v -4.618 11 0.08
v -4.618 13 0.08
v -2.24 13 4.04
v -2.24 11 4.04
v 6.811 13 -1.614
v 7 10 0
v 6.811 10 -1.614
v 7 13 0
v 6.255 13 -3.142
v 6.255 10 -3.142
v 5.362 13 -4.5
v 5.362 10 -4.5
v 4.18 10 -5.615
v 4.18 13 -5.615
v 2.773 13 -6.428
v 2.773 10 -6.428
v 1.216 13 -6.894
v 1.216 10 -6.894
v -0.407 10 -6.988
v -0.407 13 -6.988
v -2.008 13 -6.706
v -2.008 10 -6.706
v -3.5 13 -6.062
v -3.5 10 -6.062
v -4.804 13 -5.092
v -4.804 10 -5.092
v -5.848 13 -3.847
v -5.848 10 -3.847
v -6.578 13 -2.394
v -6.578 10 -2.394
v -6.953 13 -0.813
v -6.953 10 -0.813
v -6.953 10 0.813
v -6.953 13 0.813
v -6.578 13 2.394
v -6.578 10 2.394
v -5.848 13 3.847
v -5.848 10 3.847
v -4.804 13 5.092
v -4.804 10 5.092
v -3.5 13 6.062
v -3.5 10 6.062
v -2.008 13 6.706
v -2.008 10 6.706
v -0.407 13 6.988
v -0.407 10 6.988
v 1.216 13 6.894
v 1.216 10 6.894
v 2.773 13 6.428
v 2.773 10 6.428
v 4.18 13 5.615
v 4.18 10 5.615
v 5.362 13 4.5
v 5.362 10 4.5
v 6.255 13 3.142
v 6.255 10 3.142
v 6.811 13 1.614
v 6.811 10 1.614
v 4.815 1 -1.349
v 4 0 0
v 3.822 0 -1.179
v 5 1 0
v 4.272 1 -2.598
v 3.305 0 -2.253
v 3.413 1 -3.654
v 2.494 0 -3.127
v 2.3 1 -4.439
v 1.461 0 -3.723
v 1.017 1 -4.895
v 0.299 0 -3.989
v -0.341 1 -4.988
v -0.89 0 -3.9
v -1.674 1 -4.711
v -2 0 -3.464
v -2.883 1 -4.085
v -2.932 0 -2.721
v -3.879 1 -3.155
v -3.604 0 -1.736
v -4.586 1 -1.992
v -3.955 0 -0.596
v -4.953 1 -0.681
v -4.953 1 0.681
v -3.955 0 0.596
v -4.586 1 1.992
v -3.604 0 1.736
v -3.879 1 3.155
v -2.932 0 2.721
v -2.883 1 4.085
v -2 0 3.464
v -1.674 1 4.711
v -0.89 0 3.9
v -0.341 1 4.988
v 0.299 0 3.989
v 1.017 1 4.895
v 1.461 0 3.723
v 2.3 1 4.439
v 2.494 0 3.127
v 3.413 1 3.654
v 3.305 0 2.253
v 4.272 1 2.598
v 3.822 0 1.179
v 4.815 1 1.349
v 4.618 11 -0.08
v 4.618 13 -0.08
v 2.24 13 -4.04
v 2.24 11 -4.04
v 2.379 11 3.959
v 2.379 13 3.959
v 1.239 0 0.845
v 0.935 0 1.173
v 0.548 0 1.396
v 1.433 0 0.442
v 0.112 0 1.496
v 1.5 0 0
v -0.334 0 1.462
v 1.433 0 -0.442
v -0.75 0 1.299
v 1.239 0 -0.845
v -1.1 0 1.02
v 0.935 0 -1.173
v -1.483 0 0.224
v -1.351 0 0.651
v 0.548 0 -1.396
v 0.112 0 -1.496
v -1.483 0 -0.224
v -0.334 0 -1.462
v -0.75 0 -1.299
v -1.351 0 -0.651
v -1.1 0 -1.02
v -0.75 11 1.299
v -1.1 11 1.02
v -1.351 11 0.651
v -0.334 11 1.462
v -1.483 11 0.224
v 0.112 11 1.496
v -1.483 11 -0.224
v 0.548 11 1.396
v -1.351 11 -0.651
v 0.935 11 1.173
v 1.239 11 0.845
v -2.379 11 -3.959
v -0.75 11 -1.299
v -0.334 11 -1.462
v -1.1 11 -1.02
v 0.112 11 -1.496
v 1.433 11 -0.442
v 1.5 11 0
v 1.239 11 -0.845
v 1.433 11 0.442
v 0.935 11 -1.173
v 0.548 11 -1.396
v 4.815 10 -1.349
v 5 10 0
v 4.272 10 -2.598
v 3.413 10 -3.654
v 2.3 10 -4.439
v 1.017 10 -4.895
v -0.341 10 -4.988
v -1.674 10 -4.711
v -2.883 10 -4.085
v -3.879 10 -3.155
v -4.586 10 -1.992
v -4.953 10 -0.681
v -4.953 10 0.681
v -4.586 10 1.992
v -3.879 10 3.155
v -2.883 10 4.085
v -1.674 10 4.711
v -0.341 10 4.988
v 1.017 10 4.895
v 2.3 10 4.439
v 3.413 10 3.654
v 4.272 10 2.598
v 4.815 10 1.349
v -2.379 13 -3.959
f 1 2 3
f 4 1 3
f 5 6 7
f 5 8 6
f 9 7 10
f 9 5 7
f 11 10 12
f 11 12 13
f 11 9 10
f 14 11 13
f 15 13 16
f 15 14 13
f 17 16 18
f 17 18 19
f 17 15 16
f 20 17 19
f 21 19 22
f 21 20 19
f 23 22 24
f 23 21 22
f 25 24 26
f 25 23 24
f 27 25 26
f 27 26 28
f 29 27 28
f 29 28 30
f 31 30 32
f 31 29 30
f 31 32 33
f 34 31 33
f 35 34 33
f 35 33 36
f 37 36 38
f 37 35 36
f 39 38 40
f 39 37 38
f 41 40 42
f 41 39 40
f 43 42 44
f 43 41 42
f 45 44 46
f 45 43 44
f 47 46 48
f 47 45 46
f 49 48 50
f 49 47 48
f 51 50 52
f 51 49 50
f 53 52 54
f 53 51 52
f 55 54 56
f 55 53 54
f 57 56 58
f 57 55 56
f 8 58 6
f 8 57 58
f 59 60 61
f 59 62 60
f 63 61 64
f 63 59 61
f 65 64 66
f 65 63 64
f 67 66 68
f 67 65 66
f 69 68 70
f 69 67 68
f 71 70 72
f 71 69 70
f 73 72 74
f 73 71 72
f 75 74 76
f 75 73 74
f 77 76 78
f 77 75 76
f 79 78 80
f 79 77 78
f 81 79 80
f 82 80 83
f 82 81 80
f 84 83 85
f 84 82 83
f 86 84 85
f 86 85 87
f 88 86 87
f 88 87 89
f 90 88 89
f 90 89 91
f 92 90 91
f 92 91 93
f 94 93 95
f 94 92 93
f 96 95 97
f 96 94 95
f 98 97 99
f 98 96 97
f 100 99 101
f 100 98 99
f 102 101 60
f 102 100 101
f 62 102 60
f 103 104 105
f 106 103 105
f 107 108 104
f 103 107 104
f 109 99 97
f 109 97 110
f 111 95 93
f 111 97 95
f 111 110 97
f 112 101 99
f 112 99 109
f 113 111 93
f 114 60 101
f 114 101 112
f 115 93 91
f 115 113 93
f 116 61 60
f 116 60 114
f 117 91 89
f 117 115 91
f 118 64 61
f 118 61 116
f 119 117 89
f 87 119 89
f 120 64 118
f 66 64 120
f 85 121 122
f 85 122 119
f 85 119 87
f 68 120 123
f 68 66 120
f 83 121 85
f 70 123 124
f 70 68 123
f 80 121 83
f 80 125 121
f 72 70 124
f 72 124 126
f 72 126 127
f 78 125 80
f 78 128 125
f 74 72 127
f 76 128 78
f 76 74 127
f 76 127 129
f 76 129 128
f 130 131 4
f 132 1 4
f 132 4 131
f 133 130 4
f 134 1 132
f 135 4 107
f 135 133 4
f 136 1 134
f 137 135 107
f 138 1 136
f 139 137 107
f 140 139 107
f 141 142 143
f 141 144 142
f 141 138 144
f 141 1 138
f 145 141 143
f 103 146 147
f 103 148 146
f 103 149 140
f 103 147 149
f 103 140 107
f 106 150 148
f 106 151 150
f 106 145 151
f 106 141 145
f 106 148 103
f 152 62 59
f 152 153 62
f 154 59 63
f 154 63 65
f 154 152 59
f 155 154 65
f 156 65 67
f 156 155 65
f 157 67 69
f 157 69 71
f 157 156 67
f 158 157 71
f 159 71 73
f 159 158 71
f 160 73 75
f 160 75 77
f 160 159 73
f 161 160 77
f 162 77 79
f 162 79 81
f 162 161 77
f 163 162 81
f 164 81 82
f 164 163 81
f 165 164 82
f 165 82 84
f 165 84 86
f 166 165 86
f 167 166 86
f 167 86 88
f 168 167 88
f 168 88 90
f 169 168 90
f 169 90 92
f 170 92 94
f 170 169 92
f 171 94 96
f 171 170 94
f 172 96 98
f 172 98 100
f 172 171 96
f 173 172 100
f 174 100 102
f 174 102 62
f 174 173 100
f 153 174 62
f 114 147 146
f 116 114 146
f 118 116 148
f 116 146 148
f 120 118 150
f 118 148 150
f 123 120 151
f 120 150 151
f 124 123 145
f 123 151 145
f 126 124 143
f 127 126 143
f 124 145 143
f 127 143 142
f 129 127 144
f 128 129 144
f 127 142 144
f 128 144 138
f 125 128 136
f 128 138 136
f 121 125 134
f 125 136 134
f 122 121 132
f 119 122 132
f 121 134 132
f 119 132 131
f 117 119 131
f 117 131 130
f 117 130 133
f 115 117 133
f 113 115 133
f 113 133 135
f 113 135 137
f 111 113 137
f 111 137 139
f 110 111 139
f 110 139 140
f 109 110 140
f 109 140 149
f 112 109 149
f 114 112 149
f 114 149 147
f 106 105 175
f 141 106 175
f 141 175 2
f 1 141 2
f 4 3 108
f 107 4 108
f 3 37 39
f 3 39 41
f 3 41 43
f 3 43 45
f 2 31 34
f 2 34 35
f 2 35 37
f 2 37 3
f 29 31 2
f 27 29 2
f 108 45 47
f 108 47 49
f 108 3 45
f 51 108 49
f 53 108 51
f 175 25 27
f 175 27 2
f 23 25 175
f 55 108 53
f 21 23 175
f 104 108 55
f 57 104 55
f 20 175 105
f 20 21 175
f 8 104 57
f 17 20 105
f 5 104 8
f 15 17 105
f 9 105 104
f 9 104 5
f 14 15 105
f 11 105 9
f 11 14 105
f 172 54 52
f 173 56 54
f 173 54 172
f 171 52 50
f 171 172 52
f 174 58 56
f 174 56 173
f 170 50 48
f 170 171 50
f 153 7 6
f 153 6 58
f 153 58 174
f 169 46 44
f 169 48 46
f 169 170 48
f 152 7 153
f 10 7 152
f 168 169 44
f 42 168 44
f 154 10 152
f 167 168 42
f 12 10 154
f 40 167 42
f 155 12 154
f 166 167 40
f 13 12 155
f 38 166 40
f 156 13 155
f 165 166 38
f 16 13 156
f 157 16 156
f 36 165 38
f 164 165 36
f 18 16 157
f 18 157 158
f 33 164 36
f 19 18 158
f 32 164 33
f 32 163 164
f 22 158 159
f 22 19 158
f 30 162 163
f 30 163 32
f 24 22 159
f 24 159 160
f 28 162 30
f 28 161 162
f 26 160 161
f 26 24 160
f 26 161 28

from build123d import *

# Parameters (mm, degrees)
SKETCH3_R          = 1.5
CUT_EXTRUDE1_DEPTH = 14
CUT_EXTRUDE2_DEPTH = 2


with BuildPart() as part:
    # Sketch1 → Revolve1 (revolve)
    with BuildSketch(Plane.XY):
        Polygon((7, 13), (0, 13), (0, 10), (0, 0), (4, 0), (5, 1), (5, 10), (7, 10), align=None)
    revolve(axis=Axis((0, -4.570663127, 0), (0, 1, 0)))

    # Sketch3 → Cut-Extrude1 (cut, through all)
    with BuildSketch(Plane(origin=(0, 13, 0), x_dir=(1, 0, 0), z_dir=(0, 1, 0))):
        Circle(SKETCH3_R)
    extrude(amount=-CUT_EXTRUDE1_DEPTH, mode=Mode.SUBTRACT)

    # Sketch4 → Cut-Extrude2 (cut)
    with BuildSketch(Plane(origin=(0, 13, 0), x_dir=(1, 0, 0), z_dir=(0, 1, 0))):
        Polygon((2.239533559, 4.039532494), (-2.37857098, 3.959259202), (-4.618104539, -0.080273292), (-2.239533559, -4.039532494), (2.37857098, -3.959259202), (4.618104539, 0.080273292), align=None)
    extrude(amount=-CUT_EXTRUDE2_DEPTH, mode=Mode.SUBTRACT)


solid = part.part
